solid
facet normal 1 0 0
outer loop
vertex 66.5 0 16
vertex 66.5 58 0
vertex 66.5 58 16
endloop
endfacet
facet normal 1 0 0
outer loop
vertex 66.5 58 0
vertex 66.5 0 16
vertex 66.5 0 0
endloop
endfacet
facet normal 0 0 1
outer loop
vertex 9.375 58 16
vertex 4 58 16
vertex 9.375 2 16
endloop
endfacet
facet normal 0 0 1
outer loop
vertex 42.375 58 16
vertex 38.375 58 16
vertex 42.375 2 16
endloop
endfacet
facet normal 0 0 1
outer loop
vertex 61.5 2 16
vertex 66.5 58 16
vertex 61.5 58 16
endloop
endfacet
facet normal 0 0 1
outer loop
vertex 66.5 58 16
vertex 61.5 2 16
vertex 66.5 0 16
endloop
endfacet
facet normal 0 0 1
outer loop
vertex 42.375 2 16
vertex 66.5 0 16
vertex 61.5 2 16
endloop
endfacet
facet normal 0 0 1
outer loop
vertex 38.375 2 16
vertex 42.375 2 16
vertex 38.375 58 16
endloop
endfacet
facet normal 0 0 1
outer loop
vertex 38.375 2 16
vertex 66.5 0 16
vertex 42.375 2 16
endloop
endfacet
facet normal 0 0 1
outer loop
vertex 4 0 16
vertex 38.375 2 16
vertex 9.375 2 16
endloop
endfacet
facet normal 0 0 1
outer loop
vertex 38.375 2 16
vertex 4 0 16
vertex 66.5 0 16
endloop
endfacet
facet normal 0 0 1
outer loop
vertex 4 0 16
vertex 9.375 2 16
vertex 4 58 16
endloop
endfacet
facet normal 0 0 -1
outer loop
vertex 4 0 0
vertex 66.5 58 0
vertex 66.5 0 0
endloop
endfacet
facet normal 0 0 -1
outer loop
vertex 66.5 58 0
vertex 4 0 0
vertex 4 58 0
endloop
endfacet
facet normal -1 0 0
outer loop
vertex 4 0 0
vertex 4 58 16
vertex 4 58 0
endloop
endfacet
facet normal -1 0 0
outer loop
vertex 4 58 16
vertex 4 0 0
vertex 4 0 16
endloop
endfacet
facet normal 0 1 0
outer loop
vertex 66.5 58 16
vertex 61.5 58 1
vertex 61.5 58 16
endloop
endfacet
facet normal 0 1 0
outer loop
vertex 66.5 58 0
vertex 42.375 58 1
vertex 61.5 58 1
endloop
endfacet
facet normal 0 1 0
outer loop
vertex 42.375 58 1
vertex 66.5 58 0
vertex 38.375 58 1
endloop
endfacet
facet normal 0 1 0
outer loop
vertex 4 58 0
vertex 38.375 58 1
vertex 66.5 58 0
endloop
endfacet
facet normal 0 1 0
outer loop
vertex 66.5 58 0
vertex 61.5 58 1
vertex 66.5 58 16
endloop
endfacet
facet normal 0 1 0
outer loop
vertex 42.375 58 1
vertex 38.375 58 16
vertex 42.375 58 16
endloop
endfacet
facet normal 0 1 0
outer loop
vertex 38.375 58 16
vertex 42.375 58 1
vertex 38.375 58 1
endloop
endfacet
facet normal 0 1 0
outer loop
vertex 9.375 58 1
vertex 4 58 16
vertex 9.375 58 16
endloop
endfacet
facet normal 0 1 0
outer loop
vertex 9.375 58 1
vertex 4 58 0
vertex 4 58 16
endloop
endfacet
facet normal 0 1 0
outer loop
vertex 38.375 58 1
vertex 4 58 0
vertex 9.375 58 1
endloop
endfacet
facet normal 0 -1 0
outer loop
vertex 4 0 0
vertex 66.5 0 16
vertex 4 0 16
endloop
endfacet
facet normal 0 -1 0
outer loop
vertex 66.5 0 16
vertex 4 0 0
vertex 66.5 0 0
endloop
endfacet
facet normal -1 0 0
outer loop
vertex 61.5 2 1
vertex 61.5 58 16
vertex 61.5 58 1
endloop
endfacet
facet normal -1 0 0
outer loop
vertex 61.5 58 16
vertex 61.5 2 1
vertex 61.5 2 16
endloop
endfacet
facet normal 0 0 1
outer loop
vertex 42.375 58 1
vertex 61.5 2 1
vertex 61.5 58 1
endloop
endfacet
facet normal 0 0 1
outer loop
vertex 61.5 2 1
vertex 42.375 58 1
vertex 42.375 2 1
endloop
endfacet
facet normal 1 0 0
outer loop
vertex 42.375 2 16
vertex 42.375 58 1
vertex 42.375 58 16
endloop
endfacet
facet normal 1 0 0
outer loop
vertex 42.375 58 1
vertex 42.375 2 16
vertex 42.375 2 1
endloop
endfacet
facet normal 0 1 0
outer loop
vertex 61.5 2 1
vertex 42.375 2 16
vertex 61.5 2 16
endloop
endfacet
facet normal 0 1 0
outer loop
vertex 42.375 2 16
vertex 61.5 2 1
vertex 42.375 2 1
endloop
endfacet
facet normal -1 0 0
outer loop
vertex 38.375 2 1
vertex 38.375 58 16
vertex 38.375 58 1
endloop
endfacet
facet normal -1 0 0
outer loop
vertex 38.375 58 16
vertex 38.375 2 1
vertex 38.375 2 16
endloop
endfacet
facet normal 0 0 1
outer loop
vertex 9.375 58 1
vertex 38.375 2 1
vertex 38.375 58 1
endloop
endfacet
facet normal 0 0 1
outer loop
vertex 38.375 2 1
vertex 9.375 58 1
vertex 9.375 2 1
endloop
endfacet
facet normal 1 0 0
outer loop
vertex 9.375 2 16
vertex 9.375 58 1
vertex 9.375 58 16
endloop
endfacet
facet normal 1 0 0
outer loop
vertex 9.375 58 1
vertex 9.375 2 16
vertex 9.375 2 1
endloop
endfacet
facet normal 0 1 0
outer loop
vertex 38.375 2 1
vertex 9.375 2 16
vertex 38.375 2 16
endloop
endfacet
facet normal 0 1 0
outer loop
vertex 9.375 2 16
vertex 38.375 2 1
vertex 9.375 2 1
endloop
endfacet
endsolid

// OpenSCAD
//Socket size
L=62.5;
l=58;
h=16;

//Lipo size
lipol=l-2;
lipoL=29;
lipoh=h;

wallThickness=2;

//hole for connectors
secondaryHolel=(L-lipoL-4*wallThickness)/2;

difference(){
    translate([4,0,0])cube([L,l,h]);
    translate([L-wallThickness-secondaryHolel*1.5+1,wallThickness,1])cube([secondaryHolel*1.5,lipol,lipoh]);
    translate([wallThickness+secondaryHolel/2+wallThickness-1,wallThickness,1])cube([lipoL,lipol,lipoh]);
}
